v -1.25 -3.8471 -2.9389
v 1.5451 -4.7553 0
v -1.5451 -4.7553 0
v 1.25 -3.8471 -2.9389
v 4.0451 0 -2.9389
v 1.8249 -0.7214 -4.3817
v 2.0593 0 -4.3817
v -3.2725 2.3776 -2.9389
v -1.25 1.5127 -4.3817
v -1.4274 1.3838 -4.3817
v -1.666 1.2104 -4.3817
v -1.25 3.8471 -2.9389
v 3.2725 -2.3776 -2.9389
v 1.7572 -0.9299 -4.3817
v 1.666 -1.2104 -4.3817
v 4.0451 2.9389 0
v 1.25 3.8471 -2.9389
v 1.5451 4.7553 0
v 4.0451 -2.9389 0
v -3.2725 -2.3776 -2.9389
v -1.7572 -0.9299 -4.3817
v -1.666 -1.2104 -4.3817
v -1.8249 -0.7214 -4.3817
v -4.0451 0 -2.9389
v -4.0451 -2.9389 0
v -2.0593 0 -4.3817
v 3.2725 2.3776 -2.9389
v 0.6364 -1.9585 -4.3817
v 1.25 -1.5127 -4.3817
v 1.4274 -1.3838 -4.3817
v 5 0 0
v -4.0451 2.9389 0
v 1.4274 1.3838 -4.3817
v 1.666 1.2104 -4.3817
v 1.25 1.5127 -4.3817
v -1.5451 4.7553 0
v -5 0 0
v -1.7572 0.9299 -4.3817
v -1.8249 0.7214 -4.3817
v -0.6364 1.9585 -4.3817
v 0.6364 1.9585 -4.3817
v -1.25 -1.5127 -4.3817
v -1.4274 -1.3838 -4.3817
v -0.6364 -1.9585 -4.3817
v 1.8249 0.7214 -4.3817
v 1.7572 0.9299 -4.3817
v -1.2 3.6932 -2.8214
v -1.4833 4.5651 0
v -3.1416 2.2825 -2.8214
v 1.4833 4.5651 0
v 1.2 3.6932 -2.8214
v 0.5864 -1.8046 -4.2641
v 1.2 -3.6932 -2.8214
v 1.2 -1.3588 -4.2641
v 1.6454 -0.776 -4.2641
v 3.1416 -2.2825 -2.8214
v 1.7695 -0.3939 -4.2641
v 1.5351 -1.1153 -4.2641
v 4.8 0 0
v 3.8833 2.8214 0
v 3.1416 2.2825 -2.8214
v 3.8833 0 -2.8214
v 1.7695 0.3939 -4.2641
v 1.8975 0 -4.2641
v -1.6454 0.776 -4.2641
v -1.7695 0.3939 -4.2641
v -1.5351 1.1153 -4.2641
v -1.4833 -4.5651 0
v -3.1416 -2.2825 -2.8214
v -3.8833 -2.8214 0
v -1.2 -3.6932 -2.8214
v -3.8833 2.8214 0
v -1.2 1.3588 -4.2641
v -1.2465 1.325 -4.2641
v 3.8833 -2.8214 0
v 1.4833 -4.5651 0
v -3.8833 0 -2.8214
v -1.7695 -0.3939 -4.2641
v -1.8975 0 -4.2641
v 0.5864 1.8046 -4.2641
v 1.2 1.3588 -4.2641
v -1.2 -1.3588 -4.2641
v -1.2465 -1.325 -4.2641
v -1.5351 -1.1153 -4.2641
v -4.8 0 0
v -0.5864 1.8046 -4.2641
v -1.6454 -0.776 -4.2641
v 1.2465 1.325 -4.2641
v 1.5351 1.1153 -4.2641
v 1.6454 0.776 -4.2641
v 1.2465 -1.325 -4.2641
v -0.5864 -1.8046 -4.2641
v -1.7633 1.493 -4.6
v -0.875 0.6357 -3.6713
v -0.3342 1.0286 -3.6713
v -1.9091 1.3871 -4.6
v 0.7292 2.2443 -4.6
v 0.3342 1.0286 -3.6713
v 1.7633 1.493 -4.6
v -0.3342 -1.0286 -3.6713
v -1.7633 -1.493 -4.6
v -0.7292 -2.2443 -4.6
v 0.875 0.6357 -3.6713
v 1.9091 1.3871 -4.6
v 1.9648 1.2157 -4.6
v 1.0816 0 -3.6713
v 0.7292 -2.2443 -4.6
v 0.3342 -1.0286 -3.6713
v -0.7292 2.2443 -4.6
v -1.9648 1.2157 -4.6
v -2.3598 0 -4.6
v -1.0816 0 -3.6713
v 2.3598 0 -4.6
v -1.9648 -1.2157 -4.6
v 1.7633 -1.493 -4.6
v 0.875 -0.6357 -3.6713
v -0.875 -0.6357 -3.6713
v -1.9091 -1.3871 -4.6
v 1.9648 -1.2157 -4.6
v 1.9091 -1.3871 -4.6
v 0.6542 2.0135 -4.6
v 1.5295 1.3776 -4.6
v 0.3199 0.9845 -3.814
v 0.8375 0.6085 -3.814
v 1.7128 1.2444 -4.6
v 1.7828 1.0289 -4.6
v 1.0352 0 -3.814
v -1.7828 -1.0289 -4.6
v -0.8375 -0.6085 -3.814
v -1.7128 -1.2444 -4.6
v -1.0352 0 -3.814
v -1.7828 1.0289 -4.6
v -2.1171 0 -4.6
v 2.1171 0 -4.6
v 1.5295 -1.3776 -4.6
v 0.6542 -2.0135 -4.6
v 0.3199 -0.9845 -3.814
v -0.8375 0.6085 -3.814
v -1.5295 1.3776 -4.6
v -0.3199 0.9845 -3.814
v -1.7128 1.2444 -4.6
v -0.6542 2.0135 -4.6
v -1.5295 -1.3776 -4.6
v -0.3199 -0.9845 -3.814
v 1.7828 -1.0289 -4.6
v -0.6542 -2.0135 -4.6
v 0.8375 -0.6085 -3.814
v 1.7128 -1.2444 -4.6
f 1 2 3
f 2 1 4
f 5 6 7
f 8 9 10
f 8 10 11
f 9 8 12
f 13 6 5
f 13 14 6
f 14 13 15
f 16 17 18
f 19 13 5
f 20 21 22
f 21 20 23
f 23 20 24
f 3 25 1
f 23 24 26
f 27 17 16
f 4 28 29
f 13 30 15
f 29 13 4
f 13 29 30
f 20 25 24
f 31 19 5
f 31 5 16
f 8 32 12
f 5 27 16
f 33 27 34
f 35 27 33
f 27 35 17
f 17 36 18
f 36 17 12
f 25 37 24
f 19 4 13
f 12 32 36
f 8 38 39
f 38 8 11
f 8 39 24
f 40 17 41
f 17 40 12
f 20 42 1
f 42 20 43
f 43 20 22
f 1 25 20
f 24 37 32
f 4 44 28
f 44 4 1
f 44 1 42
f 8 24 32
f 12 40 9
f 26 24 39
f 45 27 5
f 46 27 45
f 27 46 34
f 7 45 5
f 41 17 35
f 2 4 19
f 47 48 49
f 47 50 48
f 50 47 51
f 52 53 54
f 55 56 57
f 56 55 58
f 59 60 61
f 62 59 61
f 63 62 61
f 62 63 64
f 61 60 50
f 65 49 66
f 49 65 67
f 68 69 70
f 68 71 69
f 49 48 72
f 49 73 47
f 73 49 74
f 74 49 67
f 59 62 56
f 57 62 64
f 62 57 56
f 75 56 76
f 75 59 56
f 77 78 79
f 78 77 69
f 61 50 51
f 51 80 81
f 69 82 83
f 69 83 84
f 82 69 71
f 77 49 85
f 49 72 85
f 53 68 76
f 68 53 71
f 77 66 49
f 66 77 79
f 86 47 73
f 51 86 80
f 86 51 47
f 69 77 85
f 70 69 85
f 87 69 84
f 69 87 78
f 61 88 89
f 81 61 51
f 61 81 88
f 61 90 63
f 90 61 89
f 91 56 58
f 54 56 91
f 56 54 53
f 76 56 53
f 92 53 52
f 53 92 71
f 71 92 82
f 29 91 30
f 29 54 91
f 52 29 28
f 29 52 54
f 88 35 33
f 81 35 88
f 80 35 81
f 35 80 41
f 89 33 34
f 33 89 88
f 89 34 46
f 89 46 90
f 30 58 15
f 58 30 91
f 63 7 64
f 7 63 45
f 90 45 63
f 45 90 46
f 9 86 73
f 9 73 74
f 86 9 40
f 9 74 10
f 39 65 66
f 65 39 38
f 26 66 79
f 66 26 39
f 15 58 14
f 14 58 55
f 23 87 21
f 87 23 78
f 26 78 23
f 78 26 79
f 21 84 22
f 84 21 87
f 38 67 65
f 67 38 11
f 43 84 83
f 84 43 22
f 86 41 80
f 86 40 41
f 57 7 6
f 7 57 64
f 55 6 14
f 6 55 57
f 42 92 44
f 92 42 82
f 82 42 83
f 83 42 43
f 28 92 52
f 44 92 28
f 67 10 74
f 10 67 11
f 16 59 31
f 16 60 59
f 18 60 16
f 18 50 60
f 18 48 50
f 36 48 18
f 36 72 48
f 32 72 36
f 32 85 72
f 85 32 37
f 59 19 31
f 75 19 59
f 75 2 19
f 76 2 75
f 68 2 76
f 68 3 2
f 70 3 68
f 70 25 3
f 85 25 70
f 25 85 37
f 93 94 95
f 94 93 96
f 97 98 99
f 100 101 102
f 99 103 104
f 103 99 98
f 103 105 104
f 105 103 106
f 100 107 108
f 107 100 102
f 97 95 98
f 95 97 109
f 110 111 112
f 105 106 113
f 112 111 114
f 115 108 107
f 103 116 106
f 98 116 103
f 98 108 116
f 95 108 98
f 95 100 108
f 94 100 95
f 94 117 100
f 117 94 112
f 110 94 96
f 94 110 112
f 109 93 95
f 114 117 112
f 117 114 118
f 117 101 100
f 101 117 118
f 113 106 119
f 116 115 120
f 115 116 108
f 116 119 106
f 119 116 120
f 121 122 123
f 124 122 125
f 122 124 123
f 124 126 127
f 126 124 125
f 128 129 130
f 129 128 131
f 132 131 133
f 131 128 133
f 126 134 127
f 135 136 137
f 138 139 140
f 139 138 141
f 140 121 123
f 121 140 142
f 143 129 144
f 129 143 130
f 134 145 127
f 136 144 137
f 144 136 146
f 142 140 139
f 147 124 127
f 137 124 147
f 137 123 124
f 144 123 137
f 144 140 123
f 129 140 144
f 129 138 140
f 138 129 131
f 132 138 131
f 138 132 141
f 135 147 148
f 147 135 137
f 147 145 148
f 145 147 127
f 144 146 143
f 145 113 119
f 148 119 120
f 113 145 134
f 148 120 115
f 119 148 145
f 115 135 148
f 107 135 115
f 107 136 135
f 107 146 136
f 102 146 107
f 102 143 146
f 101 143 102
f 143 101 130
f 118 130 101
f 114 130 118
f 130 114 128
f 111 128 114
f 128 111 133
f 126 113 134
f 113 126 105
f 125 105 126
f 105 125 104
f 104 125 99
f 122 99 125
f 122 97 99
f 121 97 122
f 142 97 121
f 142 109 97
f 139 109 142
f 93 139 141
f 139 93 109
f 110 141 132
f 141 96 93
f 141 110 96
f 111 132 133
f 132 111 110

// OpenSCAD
$fn =10;
my_size = 10;

difference() {
  union() {
    difference() {
        difference() {
          sphere(d=my_size,center=true);
          sphere(d=0.96*my_size,center=true);
          translate([0, 0, -0.7*my_size]) {
            sphere(d=0.7*my_size,center=true);
          }
        }
        translate([0, 0, 0.5*my_size]) {
          cube(size=[my_size, my_size, my_size], center=true);
         }
    };

      translate([0, 0, -0.7*my_size]) {
        difference() {
          sphere(d=0.7*my_size,center=true);
          sphere(d=0.67*my_size,center=true);
        }
      };
  };
    translate([0, 0, -0.96*my_size]) {
      cube(size=[my_size, my_size, my_size], center=true);
    };
}
